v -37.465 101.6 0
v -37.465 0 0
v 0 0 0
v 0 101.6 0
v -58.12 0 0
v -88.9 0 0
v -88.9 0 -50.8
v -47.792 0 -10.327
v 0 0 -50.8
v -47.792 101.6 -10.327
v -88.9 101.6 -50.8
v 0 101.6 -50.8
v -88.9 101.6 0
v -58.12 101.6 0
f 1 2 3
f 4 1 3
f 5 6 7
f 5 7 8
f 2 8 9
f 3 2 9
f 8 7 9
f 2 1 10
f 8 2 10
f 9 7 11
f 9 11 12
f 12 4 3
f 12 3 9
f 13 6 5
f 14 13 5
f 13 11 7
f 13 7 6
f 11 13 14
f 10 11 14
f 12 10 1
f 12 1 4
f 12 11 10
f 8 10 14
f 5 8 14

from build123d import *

# Parameters (mm, degrees)
SKETCH1_W               = 101.6
SKETCH1_H               = 50.8
BOSS_EXTRUDE1_DEPTH     = 101.6
CUT_EXTRUDE1_DEPTH      = 153.4
CUT_EXTRUDE1_DEPTH_BACK = 153.4
CUT_EXTRUDE2_DEPTH      = 153.4
CUT_EXTRUDE2_DEPTH_BACK = 153.4
SKETCH3_W               = 12.7
SKETCH3_H               = 50.8


with BuildPart() as part:
    # Sketch1 → Boss-Extrude1 (new body)
    with BuildSketch(Plane(origin=(0, 0, 0), x_dir=(1, 0, 0), z_dir=(0, 1, 0))):
        with Locations((-50.8, 25.4)):
            Rectangle(SKETCH1_W, SKETCH1_H)
    extrude(amount=BOSS_EXTRUDE1_DEPTH)

    # Sketch2 → Cut-Extrude1 (cut, two sides: drawn at the far end of the back side and taken through both)
    with BuildSketch(Plane(origin=(0, 101.6, 0), x_dir=(1, 0, 0), z_dir=(0, 1, 0)).offset(-CUT_EXTRUDE1_DEPTH_BACK)):
        Polygon((85.31205923, -122.77705923), (-37.465, 0), (-47.792294539, 10.327294539), (-58.119589078, 0), (-180.896648308, -122.77705923), (-180.896648308, -470.043023852), (85.31205923, -470.043023852), align=None)
    extrude(amount=CUT_EXTRUDE1_DEPTH + CUT_EXTRUDE1_DEPTH_BACK, mode=Mode.SUBTRACT)

    # Sketch3 → Cut-Extrude2 (cut, two sides: drawn at the far end of the back side and taken through both)
    with BuildSketch(Plane.XZ.offset(-CUT_EXTRUDE2_DEPTH_BACK)):
        with Locations((-95.25, -25.4)):
            Rectangle(SKETCH3_W, SKETCH3_H)
    extrude(amount=CUT_EXTRUDE2_DEPTH + CUT_EXTRUDE2_DEPTH_BACK, mode=Mode.SUBTRACT)


solid = part.part
